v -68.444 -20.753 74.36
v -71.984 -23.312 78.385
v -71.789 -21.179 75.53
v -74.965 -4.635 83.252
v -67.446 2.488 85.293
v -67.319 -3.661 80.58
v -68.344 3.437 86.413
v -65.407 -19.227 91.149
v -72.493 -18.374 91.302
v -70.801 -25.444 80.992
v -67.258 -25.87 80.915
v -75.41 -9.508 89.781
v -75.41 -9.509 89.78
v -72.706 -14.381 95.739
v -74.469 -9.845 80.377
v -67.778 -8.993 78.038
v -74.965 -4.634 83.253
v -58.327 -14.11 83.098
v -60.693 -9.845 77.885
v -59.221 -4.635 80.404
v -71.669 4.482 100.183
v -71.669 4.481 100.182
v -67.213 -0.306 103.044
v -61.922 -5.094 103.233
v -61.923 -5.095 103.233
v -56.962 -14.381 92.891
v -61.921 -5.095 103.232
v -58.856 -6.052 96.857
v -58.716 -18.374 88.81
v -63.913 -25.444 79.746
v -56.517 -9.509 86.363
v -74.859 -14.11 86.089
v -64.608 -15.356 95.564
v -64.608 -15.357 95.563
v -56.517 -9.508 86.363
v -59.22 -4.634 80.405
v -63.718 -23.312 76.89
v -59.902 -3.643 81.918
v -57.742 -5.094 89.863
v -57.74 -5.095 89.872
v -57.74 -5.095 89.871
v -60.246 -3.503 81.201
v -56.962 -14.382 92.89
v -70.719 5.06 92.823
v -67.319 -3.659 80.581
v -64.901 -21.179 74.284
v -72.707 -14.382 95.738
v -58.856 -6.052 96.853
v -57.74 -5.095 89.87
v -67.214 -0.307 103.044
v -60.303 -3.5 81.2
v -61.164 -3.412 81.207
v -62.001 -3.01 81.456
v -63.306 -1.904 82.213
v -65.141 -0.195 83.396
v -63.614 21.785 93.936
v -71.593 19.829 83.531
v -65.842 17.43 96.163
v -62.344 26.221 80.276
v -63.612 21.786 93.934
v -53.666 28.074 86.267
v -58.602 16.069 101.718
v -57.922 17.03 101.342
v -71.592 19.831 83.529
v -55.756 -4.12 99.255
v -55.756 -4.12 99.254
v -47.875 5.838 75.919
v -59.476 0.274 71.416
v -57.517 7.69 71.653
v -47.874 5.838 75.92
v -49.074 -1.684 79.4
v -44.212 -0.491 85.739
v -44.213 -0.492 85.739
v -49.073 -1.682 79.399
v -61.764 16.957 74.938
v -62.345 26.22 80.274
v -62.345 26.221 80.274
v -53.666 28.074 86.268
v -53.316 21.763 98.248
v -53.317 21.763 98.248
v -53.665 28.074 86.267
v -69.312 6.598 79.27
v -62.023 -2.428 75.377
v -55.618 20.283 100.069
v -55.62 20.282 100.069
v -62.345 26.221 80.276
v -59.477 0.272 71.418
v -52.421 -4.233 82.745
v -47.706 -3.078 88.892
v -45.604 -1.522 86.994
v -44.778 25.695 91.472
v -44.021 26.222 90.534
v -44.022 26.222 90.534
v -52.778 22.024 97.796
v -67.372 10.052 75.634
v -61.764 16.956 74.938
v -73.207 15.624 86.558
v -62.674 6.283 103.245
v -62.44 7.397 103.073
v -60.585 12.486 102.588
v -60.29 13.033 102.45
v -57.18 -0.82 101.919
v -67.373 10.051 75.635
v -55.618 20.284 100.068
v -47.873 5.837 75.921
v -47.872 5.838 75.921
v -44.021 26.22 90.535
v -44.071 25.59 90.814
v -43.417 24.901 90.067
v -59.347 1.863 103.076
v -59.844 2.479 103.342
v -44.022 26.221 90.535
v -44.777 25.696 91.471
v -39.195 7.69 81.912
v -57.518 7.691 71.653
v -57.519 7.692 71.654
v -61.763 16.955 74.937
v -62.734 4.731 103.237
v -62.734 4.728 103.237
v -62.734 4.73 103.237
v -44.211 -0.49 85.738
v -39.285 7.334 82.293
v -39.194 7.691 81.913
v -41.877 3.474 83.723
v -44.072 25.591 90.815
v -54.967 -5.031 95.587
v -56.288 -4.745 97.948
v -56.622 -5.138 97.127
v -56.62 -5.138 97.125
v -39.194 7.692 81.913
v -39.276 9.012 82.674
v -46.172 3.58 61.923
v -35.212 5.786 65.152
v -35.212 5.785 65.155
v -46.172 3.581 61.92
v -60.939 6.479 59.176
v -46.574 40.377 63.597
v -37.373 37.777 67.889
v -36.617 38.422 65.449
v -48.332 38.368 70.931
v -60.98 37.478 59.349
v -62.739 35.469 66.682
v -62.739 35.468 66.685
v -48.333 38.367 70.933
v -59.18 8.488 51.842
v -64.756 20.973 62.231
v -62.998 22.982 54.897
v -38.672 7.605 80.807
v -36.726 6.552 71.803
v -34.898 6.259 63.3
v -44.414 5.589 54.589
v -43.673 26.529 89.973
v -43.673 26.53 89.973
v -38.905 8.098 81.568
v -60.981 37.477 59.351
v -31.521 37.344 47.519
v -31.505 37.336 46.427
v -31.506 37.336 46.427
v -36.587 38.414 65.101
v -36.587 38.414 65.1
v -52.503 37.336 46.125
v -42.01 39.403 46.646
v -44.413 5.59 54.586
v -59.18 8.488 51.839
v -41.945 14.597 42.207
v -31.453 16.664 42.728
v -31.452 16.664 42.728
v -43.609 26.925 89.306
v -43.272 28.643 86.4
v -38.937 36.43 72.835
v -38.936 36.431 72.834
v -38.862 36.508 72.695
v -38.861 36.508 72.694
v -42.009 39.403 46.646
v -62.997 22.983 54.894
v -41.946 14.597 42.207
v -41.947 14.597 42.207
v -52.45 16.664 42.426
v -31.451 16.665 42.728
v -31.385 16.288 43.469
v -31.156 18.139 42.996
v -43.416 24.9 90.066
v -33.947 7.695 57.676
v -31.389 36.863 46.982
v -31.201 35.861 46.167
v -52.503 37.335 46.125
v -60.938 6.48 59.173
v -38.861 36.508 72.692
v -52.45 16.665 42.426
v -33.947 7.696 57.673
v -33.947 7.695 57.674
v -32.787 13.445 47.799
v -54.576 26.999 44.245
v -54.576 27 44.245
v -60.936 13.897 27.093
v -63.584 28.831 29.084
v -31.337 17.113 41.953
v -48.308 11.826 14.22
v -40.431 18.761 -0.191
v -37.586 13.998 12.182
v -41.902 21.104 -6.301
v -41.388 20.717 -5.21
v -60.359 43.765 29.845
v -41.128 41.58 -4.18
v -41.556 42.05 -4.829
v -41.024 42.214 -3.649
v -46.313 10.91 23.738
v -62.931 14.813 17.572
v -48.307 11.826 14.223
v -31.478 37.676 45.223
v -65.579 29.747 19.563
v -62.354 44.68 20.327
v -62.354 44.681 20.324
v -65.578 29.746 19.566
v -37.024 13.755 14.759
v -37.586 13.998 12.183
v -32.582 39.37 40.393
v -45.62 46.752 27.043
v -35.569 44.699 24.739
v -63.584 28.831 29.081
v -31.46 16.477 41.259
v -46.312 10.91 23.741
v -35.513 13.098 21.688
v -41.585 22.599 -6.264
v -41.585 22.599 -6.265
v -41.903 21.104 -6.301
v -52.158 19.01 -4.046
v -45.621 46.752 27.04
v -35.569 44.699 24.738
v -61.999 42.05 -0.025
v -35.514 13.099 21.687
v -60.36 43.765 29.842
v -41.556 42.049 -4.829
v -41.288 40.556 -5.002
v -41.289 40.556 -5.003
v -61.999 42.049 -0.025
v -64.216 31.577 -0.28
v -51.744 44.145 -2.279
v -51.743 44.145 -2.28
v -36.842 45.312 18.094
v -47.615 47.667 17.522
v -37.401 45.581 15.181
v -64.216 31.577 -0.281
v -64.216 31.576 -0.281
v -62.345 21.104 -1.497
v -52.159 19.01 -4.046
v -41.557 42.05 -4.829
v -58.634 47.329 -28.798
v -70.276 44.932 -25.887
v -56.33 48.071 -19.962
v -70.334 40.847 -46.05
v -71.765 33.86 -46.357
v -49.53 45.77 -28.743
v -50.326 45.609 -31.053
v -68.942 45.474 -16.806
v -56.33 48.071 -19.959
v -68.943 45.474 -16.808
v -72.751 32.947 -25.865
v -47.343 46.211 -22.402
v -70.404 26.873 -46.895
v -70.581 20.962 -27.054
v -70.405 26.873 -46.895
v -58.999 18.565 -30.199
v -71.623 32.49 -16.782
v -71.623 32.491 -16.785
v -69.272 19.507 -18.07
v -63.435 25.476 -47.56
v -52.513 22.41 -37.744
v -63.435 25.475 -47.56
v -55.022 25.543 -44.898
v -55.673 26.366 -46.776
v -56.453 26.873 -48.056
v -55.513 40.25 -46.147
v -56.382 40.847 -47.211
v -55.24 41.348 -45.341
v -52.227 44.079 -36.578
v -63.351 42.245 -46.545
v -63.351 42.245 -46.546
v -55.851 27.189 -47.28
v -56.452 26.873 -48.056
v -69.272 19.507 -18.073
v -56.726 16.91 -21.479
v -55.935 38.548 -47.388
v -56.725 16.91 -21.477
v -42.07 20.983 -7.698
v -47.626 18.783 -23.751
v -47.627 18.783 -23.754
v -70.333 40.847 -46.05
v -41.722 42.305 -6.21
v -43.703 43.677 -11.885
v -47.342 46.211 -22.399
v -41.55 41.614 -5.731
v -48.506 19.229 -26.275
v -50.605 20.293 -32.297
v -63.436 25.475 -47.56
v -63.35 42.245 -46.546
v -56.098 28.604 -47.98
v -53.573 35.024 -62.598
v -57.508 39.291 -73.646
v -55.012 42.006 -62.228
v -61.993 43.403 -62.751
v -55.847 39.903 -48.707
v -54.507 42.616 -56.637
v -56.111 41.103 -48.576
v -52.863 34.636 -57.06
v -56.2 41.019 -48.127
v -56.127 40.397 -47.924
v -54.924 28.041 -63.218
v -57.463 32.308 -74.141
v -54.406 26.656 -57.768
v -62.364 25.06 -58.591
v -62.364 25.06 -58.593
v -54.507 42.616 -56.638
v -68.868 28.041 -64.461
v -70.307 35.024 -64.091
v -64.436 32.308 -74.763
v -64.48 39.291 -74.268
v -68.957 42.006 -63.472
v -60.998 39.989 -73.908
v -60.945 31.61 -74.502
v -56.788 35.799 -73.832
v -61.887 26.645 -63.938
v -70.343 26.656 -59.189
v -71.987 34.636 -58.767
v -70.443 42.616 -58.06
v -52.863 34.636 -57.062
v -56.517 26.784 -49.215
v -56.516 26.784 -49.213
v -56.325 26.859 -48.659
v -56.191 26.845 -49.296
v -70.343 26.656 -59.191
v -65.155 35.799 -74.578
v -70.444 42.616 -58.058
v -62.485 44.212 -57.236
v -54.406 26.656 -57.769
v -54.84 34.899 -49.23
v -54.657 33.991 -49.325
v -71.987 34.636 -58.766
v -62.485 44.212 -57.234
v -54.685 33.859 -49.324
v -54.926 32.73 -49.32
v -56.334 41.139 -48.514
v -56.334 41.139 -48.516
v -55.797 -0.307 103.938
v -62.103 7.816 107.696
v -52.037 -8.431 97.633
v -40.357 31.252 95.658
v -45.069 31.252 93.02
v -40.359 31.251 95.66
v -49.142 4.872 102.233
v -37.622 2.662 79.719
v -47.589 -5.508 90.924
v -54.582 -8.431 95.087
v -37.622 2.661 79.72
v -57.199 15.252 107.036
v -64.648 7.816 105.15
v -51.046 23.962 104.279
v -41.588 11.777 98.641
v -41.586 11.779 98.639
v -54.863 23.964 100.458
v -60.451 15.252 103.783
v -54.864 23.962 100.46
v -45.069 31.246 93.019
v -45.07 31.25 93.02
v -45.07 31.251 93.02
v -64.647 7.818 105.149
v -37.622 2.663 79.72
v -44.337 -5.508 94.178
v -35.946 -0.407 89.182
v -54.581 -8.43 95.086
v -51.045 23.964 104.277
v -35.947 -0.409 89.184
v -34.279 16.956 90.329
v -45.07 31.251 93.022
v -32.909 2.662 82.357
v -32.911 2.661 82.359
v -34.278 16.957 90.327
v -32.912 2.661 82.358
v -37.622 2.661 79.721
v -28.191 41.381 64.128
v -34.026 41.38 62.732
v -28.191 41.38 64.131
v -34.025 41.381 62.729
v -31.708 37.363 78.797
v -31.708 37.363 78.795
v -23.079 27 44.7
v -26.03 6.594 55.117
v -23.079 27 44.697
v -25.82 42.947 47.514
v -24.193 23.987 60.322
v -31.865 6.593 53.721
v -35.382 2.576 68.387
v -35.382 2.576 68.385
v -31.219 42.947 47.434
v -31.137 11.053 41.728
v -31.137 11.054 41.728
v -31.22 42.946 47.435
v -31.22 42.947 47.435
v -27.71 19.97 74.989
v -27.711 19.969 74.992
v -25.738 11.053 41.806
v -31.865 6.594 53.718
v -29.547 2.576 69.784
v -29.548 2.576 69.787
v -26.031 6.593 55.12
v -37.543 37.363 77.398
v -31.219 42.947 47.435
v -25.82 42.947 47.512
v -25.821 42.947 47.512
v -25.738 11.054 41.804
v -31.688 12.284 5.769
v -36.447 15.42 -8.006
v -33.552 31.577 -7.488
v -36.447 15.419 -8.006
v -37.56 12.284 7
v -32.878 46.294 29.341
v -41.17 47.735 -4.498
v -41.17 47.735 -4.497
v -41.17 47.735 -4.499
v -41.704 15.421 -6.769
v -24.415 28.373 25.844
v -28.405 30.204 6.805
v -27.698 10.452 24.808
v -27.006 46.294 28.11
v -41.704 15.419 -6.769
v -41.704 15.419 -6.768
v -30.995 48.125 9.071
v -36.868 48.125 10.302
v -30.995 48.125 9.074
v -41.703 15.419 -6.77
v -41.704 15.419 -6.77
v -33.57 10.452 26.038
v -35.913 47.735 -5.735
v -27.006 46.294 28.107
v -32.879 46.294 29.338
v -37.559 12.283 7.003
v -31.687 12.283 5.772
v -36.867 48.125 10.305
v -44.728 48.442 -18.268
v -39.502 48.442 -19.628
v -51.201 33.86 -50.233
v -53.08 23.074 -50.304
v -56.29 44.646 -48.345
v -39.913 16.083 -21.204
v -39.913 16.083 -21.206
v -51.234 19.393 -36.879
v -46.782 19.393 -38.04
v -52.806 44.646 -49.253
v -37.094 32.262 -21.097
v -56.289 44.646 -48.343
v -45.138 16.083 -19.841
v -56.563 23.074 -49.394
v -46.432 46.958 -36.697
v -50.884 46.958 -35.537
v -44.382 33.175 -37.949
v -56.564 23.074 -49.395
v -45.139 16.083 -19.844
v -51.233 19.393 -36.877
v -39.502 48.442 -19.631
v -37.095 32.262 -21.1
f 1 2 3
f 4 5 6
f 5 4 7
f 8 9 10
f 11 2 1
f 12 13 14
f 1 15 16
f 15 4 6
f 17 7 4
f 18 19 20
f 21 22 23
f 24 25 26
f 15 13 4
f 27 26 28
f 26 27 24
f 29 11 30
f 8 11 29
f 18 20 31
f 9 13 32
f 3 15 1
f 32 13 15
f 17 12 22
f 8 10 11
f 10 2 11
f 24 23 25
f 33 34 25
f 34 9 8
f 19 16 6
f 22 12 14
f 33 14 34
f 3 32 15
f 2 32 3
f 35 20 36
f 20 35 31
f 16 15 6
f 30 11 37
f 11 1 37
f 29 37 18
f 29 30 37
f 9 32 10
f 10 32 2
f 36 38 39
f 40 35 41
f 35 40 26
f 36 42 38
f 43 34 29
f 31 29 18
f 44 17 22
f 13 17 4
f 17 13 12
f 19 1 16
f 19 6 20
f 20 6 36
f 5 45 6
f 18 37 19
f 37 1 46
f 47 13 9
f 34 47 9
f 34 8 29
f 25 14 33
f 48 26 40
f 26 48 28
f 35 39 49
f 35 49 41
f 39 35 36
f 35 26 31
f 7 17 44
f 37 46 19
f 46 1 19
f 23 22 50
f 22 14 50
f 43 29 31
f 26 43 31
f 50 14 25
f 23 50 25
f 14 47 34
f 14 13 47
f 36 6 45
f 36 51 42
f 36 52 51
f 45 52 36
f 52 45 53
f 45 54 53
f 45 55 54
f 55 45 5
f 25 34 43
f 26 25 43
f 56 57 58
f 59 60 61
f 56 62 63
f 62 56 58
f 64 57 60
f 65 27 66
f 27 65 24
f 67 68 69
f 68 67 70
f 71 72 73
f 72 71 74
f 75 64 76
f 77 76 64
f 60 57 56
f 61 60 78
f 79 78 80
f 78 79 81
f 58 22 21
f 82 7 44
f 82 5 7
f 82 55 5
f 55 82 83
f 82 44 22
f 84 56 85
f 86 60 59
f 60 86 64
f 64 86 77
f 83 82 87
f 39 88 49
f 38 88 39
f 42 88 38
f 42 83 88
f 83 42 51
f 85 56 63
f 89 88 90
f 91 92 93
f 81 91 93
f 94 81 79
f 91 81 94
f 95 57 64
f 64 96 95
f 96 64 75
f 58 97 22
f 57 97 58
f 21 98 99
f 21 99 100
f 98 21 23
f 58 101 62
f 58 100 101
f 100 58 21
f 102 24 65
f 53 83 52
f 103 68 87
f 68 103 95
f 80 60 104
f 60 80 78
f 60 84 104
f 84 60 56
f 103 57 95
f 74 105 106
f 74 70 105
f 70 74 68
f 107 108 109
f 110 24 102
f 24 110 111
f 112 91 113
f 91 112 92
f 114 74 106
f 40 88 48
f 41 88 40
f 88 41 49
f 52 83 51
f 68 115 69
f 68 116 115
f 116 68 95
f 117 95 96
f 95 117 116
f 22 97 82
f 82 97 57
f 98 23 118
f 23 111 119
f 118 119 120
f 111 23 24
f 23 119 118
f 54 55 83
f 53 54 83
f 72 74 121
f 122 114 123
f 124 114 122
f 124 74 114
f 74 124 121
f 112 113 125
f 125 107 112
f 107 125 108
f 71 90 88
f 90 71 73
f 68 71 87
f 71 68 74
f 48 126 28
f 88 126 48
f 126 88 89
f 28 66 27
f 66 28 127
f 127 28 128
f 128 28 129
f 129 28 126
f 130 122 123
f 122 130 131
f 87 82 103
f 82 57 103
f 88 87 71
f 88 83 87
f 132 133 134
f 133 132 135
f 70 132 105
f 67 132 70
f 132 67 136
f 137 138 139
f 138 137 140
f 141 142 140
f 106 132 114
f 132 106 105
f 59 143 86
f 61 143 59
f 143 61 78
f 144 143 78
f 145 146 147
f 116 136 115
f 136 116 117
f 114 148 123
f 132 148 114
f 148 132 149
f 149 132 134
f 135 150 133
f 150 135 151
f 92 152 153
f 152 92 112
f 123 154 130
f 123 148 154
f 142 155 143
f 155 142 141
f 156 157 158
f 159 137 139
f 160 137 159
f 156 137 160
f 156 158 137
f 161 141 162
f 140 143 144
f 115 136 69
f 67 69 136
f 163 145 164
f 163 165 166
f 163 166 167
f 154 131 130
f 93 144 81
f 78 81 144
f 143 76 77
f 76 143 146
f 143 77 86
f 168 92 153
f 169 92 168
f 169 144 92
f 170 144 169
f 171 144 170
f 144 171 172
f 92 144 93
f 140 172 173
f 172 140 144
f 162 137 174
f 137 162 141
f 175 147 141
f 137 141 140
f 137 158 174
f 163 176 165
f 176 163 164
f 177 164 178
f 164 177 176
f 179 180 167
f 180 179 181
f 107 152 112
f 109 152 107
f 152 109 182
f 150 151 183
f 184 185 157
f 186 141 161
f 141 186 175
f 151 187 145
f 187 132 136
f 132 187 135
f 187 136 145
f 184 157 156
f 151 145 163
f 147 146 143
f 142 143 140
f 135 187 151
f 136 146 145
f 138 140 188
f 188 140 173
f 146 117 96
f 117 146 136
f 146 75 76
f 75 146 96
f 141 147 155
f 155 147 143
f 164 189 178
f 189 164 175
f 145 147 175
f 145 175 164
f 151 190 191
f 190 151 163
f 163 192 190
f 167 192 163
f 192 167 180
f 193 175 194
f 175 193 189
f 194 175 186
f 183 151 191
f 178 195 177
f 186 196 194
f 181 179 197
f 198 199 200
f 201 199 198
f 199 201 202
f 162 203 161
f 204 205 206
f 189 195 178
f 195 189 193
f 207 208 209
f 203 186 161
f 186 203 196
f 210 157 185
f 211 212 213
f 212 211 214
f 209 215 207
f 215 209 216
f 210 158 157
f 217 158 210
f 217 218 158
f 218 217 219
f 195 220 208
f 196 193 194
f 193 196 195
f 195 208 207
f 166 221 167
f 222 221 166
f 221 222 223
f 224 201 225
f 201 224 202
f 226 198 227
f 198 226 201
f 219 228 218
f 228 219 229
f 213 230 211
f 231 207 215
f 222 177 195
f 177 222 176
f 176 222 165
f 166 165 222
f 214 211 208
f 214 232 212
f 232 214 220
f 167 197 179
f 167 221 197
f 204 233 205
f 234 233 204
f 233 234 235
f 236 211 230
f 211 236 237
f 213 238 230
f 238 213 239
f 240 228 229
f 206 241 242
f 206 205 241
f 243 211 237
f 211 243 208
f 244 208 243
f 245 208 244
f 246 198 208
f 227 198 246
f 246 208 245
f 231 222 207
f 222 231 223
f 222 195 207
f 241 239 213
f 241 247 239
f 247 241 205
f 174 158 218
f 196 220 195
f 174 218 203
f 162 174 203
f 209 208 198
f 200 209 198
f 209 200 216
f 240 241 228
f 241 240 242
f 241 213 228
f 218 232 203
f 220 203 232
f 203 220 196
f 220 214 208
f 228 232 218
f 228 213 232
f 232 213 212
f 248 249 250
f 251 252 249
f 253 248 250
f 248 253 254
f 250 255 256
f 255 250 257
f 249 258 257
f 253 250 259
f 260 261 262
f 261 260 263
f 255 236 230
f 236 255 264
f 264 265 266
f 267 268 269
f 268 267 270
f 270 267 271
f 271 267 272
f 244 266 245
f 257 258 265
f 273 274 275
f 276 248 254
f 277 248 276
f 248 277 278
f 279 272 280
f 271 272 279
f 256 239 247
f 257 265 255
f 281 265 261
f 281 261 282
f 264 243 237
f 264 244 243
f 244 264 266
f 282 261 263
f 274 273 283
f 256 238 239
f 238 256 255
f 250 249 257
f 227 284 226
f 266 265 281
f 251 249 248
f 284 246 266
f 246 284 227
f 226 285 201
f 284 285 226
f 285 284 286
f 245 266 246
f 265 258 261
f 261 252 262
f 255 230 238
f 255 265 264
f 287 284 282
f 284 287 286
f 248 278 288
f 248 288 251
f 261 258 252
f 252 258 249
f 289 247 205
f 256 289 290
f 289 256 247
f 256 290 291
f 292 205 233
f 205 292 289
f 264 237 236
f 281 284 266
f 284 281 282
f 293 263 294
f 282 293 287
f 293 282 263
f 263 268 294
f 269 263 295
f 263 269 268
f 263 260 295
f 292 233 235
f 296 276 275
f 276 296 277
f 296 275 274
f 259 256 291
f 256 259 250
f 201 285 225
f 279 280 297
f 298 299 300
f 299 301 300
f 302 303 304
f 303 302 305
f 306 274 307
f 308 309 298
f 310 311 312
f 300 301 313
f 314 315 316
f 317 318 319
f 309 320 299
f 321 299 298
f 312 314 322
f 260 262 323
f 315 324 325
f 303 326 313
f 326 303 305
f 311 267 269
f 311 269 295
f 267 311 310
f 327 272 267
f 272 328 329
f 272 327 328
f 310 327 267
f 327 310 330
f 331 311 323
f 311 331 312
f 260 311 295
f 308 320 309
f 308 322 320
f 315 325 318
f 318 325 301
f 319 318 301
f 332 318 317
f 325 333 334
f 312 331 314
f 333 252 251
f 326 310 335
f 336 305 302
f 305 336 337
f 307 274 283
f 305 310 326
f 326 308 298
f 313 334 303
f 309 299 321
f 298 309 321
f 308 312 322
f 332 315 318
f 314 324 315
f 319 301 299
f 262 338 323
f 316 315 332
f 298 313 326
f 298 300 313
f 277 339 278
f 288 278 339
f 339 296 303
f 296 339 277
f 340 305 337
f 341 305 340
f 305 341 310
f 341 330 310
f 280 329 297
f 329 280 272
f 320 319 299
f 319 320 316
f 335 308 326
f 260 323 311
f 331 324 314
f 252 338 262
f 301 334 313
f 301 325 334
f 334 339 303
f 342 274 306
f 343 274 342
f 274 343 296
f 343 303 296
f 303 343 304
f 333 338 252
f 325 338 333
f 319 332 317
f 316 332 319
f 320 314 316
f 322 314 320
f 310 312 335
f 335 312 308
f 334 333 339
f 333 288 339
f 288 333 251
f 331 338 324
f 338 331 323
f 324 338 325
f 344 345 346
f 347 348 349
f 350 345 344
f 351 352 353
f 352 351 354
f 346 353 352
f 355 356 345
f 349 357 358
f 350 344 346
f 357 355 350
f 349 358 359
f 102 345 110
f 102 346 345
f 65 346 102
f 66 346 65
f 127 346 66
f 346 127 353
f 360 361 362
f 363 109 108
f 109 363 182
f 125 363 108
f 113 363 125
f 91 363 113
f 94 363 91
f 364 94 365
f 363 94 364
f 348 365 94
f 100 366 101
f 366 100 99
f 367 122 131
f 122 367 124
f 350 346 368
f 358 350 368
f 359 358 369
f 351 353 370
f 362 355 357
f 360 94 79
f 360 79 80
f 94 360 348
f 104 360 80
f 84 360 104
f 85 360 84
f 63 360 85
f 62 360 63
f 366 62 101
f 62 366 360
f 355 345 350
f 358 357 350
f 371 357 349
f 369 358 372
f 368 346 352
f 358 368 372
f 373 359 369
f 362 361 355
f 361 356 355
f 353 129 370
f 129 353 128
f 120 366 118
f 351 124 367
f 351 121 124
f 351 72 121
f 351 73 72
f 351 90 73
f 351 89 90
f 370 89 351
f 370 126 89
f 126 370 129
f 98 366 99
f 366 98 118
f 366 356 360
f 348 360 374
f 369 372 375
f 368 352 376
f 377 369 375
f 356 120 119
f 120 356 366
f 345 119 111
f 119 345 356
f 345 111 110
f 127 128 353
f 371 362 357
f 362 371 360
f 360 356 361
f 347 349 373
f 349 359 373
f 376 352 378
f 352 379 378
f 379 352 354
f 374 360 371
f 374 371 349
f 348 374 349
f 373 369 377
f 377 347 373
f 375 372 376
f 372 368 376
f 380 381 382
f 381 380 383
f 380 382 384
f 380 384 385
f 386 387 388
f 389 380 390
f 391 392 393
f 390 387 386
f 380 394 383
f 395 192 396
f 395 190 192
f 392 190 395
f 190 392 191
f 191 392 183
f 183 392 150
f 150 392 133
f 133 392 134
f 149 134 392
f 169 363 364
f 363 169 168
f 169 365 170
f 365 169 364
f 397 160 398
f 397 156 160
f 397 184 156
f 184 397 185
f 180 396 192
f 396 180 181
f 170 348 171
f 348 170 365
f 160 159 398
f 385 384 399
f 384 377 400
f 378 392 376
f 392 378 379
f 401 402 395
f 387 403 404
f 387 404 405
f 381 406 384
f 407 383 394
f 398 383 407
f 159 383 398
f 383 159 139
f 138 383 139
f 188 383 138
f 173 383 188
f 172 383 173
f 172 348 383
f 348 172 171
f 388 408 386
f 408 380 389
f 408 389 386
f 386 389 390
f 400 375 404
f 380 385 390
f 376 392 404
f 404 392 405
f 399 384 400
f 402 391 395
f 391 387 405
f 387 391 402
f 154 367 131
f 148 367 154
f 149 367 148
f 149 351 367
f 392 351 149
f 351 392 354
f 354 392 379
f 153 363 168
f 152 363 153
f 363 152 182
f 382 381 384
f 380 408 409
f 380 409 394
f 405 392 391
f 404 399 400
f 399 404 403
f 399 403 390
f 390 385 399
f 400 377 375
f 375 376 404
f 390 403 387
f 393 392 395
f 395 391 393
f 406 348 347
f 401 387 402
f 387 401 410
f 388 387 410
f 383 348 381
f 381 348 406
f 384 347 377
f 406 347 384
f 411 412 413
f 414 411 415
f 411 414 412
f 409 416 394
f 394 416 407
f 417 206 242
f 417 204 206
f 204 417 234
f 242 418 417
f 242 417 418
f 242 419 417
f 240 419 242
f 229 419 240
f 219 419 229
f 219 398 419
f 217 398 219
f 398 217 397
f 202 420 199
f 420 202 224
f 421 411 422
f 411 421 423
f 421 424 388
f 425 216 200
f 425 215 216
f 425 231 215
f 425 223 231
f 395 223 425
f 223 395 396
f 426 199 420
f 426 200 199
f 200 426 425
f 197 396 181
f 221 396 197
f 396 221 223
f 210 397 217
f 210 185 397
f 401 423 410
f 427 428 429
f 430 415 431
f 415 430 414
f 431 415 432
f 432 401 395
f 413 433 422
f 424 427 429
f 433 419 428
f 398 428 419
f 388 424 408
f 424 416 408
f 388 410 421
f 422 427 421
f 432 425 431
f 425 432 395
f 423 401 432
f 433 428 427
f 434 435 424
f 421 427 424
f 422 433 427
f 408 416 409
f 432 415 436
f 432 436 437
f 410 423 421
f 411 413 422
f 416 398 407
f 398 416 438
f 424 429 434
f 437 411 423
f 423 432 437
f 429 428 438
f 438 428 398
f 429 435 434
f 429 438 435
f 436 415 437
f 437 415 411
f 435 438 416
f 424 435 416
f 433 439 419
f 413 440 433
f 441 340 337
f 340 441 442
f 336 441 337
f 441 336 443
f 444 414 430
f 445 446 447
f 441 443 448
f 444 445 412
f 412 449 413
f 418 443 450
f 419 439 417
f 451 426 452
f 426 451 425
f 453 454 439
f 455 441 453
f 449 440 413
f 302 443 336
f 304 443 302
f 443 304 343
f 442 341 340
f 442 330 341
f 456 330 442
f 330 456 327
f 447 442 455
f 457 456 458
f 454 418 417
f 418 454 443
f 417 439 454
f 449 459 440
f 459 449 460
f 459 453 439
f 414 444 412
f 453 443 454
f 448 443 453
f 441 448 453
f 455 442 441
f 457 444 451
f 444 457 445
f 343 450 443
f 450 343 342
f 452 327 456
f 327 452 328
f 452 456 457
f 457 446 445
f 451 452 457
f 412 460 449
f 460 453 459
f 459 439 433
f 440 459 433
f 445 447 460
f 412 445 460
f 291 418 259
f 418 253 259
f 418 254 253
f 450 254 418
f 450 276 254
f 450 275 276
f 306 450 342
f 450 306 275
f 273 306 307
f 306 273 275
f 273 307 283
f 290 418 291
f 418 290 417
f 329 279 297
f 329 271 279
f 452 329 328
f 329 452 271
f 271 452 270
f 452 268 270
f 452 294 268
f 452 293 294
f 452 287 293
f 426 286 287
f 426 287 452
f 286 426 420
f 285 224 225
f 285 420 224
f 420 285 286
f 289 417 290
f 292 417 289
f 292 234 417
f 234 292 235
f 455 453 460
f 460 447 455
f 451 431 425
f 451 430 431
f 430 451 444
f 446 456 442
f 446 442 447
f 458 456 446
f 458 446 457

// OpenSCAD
V3d = [
  [-67.8509, 77.6378, 23.3115,1],
  [-64.7054, 95.027, 0.307143,2],
  [-50.7696,  81.0949,-16.9558,3],
  [-41.9771, 44.4277,-26.9999, 3],
  [-51.9501,  -3.16171,-31.5773,3],
  [-63.3934,-47.0519, -33.86, 2],
  [-60.9717,  -74.2041,-35.7994,1],
];
V3d2 = [

  [-64.7054, 95.027, 0.307143,2],
  [-50.7696,  81.0949,-16.9558,3],
  [-41.9771, 44.4277,-26.9999, 3],
  [-51.9501,  -3.16171,-31.5773,3],
  [-63.3934,-47.0519, -33.86, 2],
];


profile = [
  [5, 5],
  [0,6],
[-5, 5],
[-6,0],
[-5, -5],
[0,-6],
[5, -5],
[6,0]

];profile2 = [
[-6,4],
[-6, 6],
[0,7],
[6, 6],
[6,4]

];
rotate([90,0,0]){
bodypart(profile, V3d );bodypart(profile2, V3d2,0.9,0.3,0.7 );
    
}
module bodypart(profile, List, grove=0.7,lrp1=0.4,lrp2=0.6) {
    lrp0=0;
    lrp3=1;
   sth = 0.001;
  for(i = [0: len(List) - 2]) {
    hull() {
      if(i == 0) {
          
color("red")
ttranslate(List[i]) rotate(getangle(v(i,List)))  scale(lerp(List[i][3],List[i+1][3],lrp0)) scale(grove)  linear_extrude(height = sth) polygon(profile);
ttranslate(lerp(List[i ],List[i + 1],lrp1)) rotate(getangle(v(i,List) ) )    scale(lerp(List[i][3],List[i+1][3],lrp1)) linear_extrude(height = sth) polygon(profile);
ttranslate(lerp(List[i ],List[i + 1],lrp2)) rotate(getangle(v(i,List) ) )    scale(lerp(List[i][3],List[i+1][3],lrp2)) linear_extrude(height = sth) polygon(profile);

color("green")
ttranslate(List[i + 1]) rotate((getangle(v(i,List)) + getangle(v(i+1,List))) / 2) scale(lerp(List[i][3],List[i+1][3],lrp3))  scale(grove)  linear_extrude(height = sth) polygon(profile);
      
} else if(i == len(List) - 2) {

color("red")
ttranslate(List[i ])  rotate((getangle(v(i-1,List)) + getangle(v(i,List))) / 2)   scale(lerp(List[i][3],List[i+1][3],lrp0)) scale(grove)  linear_extrude(height = sth) polygon(profile);


ttranslate(lerp(List[i ],List[i + 1],lrp1)) rotate(getangle(v(i,List) ) )    scale(lerp(List[i][3],List[i+1][3],lrp1)) linear_extrude(height = sth) polygon(profile);
ttranslate(lerp(List[i ],List[i + 1],lrp2)) rotate(getangle(v(i,List) ) )    scale(lerp(List[i][3],List[i+1][3],lrp2)) linear_extrude(height = sth) polygon(profile);

color("green")
ttranslate(List[i+1]) rotate(getangle(v(i,List))) scale(lerp(List[i][3],List[i+1][3],lrp3))  scale(grove)  linear_extrude(height = sth) polygon(profile);

      } 
 else {
echo(getangle(v(i,List)));
color("red")
ttranslate(List[i ])  rotate((getangle(v(i-1,List)) + getangle(v(i,List))) / 2)   scale(lerp(List[i][3],List[i+1][3],lrp0)) scale(grove)  linear_extrude(height = sth) polygon(profile);


ttranslate(lerp(List[i ],List[i + 1],lrp1)) rotate(getangle(v(i,List) ) )    scale(lerp(List[i][3],List[i+1][3],lrp1)) linear_extrude(height = sth) polygon(profile);
ttranslate(lerp(List[i ],List[i + 1],lrp2)) rotate(getangle(v(i,List) ) )    scale(lerp(List[i][3],List[i+1][3],lrp2))  linear_extrude(height = sth) polygon(profile);

color("green")
ttranslate(List[i + 1]) rotate((getangle(v(i,List)) + getangle(v(i+1,List))) / 2)scale(lerp(List[i][3],List[i+1][3],lrp3))   scale(grove)  linear_extrude(height = sth) polygon(profile);
 
     }
    }
  }
}
module ttranslate(v){
          for (j=[0:$children-1]) 
      translate(t(v))  children(j);
    }
    
function getangle(v) = (len(v) == 3||len(v) == 4) ? [0, 90, 0] + geteuler(lim3(1, v)): [90, 0, 0] + [0, 0, -atan2(v[0], v[1])];
function lerp(start,end,bias ) = (end * bias + start * (1 - bias));
function geteuler(v) = [0, -asin(v[2]), atan2(v2xy(v)[1], v2xy(v)[0])]; //Euler angles from Vec3
function v2xy(v) = lim3(1, [v[0], v[1], 0]); // down projection xyz2xy
function lim3(l, v) = v / len3(v) * l; // normalize Vec37Vec4 to magnitude l
function len3(v) = sqrt(pow(v[0], 2) + pow(v[1], 2) + pow(v[2], 2)); // find magnitude of Vec3
function v(i,v)=v[i+1]-v[i]; // vec3 from polyline segment
function t(v) = [v[0], v[1], v[2]];// purge vec4... down to vec3 (for translate to play nice)
